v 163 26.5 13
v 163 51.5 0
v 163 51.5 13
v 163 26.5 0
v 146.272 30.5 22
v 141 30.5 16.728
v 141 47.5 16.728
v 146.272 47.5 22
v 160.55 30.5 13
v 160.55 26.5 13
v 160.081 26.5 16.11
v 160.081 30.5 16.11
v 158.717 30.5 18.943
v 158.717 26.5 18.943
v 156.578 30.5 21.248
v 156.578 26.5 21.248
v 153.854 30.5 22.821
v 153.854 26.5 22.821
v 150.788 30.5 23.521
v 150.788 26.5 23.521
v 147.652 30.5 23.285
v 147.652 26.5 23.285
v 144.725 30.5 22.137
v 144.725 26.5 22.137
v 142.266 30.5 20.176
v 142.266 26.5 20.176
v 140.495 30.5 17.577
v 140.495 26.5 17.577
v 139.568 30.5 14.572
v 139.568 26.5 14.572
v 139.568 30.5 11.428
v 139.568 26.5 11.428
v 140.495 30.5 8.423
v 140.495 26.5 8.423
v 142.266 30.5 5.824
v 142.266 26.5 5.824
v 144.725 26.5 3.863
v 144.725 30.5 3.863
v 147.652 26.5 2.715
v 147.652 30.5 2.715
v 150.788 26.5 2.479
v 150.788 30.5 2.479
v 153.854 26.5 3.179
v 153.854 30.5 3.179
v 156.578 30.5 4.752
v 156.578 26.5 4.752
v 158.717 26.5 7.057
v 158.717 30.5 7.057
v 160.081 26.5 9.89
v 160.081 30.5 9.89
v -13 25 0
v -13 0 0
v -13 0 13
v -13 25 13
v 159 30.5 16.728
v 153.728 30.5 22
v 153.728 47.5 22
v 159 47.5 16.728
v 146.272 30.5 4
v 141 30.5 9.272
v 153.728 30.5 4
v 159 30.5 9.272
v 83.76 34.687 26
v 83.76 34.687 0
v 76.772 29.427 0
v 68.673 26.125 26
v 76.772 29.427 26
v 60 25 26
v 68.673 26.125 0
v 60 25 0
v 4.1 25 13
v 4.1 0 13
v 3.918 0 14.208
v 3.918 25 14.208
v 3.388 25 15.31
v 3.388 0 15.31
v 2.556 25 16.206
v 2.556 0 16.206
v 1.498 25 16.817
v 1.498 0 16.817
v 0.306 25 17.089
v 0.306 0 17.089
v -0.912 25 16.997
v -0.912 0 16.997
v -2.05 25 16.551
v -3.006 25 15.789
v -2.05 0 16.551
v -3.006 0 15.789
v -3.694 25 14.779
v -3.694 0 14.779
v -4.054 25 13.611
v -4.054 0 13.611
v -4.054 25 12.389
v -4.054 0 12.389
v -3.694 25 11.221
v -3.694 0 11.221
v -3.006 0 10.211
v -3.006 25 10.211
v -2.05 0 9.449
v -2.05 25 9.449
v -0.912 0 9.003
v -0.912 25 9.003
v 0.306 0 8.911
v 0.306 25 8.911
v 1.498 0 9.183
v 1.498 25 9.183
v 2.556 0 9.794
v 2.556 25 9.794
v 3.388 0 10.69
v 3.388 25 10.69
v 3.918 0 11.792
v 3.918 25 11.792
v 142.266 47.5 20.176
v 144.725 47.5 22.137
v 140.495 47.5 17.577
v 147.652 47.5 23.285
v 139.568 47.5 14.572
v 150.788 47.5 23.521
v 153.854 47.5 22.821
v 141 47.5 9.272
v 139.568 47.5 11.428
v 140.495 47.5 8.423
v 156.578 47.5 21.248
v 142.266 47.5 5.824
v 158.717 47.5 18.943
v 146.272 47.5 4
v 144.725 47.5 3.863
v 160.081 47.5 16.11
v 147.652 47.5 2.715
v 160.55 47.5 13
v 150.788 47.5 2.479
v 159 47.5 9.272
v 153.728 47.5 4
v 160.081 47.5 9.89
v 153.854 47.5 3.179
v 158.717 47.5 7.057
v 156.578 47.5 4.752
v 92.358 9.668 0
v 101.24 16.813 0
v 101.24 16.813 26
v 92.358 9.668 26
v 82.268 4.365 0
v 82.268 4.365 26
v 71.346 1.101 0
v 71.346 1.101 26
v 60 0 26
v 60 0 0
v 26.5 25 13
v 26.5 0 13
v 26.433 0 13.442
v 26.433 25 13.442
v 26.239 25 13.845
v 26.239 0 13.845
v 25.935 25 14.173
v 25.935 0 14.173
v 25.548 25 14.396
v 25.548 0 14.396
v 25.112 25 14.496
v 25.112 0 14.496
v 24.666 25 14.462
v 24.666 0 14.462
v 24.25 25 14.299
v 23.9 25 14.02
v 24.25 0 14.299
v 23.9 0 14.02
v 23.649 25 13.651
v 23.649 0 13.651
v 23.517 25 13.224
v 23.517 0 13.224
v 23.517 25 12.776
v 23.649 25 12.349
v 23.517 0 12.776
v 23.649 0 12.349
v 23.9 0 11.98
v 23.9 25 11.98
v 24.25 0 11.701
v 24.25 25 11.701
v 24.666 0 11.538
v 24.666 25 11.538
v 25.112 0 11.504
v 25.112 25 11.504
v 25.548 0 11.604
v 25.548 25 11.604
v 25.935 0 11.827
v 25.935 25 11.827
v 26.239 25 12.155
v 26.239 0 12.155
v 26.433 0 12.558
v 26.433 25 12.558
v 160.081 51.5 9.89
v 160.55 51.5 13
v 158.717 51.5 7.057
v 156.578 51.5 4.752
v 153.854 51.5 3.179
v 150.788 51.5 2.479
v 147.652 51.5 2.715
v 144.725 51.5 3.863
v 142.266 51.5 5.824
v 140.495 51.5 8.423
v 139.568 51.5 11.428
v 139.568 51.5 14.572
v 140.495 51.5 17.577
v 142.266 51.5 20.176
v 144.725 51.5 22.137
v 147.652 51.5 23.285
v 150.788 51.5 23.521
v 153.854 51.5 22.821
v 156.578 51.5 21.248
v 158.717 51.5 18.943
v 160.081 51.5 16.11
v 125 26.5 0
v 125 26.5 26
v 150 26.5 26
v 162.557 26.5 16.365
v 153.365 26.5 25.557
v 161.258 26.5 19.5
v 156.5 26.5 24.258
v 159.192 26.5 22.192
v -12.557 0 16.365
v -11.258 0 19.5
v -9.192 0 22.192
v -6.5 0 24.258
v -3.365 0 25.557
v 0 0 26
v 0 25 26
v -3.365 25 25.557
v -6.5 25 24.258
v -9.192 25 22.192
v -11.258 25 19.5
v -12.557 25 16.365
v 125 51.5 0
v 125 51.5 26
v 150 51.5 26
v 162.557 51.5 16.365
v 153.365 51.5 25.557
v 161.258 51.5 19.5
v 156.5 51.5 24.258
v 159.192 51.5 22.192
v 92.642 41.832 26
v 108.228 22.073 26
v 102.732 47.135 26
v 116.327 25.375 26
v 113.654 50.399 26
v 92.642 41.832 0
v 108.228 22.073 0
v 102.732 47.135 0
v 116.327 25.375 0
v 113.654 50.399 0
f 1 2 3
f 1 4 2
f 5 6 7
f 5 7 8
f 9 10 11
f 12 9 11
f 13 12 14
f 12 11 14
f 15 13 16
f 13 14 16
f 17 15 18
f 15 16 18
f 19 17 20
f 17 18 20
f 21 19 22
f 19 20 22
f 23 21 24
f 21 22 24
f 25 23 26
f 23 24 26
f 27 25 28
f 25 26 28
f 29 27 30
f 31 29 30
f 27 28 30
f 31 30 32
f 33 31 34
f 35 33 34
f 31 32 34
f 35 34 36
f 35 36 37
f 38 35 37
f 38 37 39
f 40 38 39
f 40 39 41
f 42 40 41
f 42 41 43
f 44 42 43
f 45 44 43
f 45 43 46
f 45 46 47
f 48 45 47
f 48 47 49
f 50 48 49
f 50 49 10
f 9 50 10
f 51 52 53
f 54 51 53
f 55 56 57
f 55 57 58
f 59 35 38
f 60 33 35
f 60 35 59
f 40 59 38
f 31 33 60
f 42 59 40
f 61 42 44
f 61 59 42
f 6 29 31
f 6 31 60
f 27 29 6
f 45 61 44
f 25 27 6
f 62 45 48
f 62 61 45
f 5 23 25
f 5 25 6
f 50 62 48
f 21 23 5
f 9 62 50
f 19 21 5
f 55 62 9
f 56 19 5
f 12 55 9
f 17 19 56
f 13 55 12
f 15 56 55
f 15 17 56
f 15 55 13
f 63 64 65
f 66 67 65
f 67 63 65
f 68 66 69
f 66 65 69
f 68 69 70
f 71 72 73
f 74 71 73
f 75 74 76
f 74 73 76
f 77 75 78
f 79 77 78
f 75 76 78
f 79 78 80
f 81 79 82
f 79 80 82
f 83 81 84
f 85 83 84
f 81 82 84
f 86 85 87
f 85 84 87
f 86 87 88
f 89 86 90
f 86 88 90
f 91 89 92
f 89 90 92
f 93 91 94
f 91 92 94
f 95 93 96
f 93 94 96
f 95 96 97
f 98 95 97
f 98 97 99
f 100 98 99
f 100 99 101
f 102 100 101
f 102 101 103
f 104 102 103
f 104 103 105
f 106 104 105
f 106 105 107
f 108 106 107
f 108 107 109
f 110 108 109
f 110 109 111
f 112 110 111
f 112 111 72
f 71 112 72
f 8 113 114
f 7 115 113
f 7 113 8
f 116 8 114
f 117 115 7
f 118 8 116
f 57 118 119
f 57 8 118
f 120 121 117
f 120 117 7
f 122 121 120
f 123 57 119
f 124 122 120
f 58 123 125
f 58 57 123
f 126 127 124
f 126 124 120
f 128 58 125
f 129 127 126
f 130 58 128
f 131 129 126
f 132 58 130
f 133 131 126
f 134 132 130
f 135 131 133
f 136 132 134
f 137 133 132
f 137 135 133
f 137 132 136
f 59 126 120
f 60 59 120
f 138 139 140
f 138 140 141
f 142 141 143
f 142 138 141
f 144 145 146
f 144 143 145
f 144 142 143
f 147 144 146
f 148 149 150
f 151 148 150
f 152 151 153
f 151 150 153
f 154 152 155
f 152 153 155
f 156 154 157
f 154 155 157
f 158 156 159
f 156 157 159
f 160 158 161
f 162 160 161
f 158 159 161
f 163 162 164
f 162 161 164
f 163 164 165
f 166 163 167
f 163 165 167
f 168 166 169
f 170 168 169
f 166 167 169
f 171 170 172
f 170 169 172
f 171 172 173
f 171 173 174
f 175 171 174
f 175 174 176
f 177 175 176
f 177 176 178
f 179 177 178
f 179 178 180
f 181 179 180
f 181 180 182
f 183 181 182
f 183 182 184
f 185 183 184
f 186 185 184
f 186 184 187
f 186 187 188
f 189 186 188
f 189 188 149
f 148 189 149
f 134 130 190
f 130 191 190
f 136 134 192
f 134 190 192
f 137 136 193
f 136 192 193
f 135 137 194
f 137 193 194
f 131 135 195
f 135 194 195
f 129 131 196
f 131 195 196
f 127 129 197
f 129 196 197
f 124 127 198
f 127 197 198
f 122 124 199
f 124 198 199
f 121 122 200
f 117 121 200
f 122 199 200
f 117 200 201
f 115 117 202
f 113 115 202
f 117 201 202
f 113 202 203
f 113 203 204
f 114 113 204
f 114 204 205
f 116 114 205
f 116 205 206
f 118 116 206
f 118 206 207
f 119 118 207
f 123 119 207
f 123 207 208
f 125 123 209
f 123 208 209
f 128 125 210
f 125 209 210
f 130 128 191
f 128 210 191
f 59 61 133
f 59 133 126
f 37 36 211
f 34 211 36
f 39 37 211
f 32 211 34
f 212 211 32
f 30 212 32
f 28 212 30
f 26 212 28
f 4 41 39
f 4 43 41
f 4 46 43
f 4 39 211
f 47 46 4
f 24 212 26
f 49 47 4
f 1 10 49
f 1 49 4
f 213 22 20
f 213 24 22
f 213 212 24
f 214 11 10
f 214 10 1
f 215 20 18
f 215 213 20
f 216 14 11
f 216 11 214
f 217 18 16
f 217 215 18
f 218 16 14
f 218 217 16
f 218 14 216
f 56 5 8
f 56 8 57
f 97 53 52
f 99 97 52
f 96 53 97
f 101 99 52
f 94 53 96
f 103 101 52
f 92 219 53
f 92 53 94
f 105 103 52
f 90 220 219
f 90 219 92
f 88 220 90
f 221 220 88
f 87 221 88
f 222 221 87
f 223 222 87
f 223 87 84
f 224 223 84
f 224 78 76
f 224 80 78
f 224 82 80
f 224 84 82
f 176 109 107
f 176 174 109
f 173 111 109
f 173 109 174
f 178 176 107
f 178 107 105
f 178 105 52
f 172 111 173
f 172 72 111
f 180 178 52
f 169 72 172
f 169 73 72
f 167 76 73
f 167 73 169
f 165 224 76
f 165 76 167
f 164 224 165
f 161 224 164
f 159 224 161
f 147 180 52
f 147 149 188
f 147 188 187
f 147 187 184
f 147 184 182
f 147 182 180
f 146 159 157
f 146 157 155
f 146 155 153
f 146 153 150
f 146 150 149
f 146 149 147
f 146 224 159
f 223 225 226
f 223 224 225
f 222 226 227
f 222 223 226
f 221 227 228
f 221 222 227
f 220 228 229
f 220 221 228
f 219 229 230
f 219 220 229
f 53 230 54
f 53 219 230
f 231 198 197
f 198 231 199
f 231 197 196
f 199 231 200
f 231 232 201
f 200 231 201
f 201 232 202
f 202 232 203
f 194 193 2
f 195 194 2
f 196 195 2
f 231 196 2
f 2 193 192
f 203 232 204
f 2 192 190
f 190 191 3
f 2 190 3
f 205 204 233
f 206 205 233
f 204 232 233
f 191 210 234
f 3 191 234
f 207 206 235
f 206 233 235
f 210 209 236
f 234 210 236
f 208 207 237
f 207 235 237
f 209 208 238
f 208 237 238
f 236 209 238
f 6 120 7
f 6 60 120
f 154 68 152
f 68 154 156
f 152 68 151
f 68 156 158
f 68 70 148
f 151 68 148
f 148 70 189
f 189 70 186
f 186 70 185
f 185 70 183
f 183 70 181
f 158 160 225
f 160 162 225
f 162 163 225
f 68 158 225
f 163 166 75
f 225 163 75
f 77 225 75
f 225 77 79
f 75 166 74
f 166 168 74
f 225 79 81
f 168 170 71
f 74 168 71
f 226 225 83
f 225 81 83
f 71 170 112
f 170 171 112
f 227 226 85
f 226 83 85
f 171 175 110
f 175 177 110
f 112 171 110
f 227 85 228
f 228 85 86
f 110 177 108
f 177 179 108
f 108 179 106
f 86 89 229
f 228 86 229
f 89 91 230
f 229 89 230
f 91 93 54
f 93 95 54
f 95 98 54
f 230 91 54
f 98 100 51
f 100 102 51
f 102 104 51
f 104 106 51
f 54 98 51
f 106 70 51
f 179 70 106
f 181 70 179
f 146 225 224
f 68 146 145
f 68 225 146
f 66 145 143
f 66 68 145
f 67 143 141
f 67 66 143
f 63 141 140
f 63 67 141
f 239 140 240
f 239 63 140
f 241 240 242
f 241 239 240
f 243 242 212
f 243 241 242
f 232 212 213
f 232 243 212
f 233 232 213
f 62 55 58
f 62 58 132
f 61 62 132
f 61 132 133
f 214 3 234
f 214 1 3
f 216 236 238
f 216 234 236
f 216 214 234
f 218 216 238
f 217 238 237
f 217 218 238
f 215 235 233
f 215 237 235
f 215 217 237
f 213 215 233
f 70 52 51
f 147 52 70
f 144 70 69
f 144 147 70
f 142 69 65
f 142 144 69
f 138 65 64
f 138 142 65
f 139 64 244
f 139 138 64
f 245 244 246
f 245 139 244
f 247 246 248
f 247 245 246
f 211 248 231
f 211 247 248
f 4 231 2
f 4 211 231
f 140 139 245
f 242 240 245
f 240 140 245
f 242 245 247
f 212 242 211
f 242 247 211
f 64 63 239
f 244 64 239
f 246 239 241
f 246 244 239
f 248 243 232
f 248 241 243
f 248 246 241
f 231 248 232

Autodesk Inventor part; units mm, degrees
ref_plane "YZ Plane" through (0, 0, 0) normal (1, 0, 0) x (0, 1, 0)
ref_plane "XZ Plane" through (0, 0, 0) normal (0, 1, 0) x (-1, 0, 0)
ref_plane "XY Plane" through (0, 0, 0) normal (0, 0, 1) x (1, 0, 0)
sketch "Sketch1" plane through (0, 0, 0) normal (0, 0, 1) x (1, 0, 0)
  line L0 (0, 0) -> (60, 0)
  arc A0 (60, 0) -> (101.2397, 16.8131) centre (60, 58.9835) ccw
  arc A1 (125, 26.5) -> (101.2397, 16.8131) centre (125, -7.4835) ccw
  line L1 (125, 26.5) -> (150, 26.5)
  line L2 (150, 26.5) -> (150, 51.5)
  line L3 (150, 51.5) -> (125, 51.5)
  arc A2 (125, 51.5) -> (83.7603, 34.6869) centre (125, -7.4835) ccw
  arc A3 (60, 25) -> (83.7603, 34.6869) centre (60, 58.9835) ccw
  line L4 (60, 25) -> (0, 25)
  line L5 (0, 25) -> (0, 0)
  dimension "d0" = 25
  dimension "d1" = 60
  dimension "d2" = 25
  dimension "d3" = 150
  dimension "d4" = 1.5
extrude "Extrusion1" add sketch "Sketch1" along normal blind 26
sketch "Sketch2" plane through (125, 26.5, 0) normal (0, -1, 0) x (1, 0, 0)
  line L0 (25, 0) -> (25, 26) projected
  circle A0 centre (25, 13) radius 13
  point P0 (-125, 0)
extrude "Extrusion2" add sketch "Sketch2" against normal up to surface (25 mm away)
sketch "Sketch3" plane through (0, 0, 0) normal (0, -1, 0) x (1, 0, 0)
  line L0 (0, 0) -> (0, 26) projected
  circle A0 centre (0, 13) radius 13
  line L1 (0, 0) -> (-13, 0)
  line L2 (-13, 0) -> (-13, 13)
extrude "Extrusion3" add sketch "Sketch3" against normal up to surface (25 mm away)
sketch "Sketch4" plane through (125, 26.5, 0) normal (0, -1, 0) x (1, 0, 0)
  line L0 (0, 0) -> (25, 0) projected
  arc A0 (25, 0) -> (25, 26) centre (25, 13) ccw projected
  line L1 (25, 0) -> (38, 0)
  line L2 (38, 0) -> (38, 13)
  point P0 (-125, 0)
extrude "Extrusion4" add sketch "Sketch4" against normal up to surface (25 mm away)
sketch "Sketch5" plane through (60, 0, 0) normal (0, -1, 0) x (1, 0, 0)
  arc A0 (-60, 26) -> (-73, 13) centre (-60, 13) ccw projected
  circle A1 centre (-60, 13) radius 4.1
  point P0 (-60, 0)
  dimension "d13" = 8.2
extrude "Extrusion5" cut sketch "Sketch5" against normal through all
sketch "Sketch6" plane through (60, 0, 0) normal (0, -1, 0) x (1, 0, 0)
  arc A0 (-60, 26) -> (-73, 13) centre (-60, 13) ccw projected
  line L0 (-73, 13) -> (-73, 0) projected
  line L1 (-60, 13) -> (-35, 13)
  circle A1 centre (-35, 13) radius 1.5
  point P0 (-60, 0)
  dimension "d17" = 3
  dimension "d19" = 25
extrude "Extrusion6" cut sketch "Sketch6" against normal through all
sketch "Sketch7" plane through (125, 26.5, 0) normal (0, -1, 0) x (1, 0, 0)
  arc A0 (38, 13) -> (25, 26) centre (25, 13) ccw projected
  circle A1 centre (25, 13) radius 10.5 construction
  circle A2 centre (25, 13) radius 7.5 construction
  line L0 (21.2721, 22) -> (28.7279, 22)
  line L1 (28.7279, 22) -> (34, 16.7279)
  line L2 (34, 16.7279) -> (34, 9.2721)
  line L3 (34, 9.2721) -> (28.7279, 4)
  line L4 (28.7279, 4) -> (21.2721, 4)
  line L5 (21.2721, 4) -> (16, 9.2721)
  line L6 (16, 9.2721) -> (16, 16.7279)
  line L7 (16, 16.7279) -> (21.2721, 22)
  point P0 (-125, 0)
  dimension "d22" = 21
  dimension "d24" = 15
  dimension "d25" = 18
extrude "Extrusion7" cut sketch "Sketch7" against normal through all
sketch "Sketch8" plane through (125, 26.5, 0) normal (0, -1, 0) x (1, 0, 0)
  line L0 (16, 16.7279) -> (21.2721, 22) projected
  line L1 (21.2721, 22) -> (28.7279, 22) projected
  line L2 (28.7279, 22) -> (34, 16.7279) projected
  line L3 (34, 16.7279) -> (34, 9.2721) projected
  line L4 (34, 9.2721) -> (28.7279, 4) projected
  line L5 (28.7279, 4) -> (21.2721, 4) projected
  line L6 (21.2721, 4) -> (16, 9.2721) projected
  line L7 (16, 9.2721) -> (16, 16.7279) projected
  arc A0 (38, 13) -> (25, 26) centre (25, 13) ccw projected
  circle A1 centre (25, 13) radius 10.55
  point P0 (-125, 0)
  dimension "d28" = 21.1
extrude "Extrusion8" cut sketch "Sketch8" against normal blind 4
sketch "Sketch9" plane through (125, 51.5, 26) normal (0, 1, 0) x (1, 0, 0)
  line L0 (21.2721, 4) -> (16, 9.2721) projected
  line L1 (16, 9.2721) -> (16, 16.7279) projected
  line L2 (16, 16.7279) -> (21.2721, 22) projected
  line L3 (21.2721, 22) -> (28.7279, 22) projected
  line L4 (28.7279, 22) -> (34, 16.7279) projected
  line L5 (34, 16.7279) -> (34, 9.2721) projected
  line L6 (34, 9.2721) -> (28.7279, 4) projected
  line L7 (28.7279, 4) -> (21.2721, 4) projected
  circle A0 centre (25, 13) radius 10.55 projected
  point P0 (-125, 26)
extrude "Extrusion9" cut sketch "Sketch9" against normal blind 4
properties part number "xy forearm"
